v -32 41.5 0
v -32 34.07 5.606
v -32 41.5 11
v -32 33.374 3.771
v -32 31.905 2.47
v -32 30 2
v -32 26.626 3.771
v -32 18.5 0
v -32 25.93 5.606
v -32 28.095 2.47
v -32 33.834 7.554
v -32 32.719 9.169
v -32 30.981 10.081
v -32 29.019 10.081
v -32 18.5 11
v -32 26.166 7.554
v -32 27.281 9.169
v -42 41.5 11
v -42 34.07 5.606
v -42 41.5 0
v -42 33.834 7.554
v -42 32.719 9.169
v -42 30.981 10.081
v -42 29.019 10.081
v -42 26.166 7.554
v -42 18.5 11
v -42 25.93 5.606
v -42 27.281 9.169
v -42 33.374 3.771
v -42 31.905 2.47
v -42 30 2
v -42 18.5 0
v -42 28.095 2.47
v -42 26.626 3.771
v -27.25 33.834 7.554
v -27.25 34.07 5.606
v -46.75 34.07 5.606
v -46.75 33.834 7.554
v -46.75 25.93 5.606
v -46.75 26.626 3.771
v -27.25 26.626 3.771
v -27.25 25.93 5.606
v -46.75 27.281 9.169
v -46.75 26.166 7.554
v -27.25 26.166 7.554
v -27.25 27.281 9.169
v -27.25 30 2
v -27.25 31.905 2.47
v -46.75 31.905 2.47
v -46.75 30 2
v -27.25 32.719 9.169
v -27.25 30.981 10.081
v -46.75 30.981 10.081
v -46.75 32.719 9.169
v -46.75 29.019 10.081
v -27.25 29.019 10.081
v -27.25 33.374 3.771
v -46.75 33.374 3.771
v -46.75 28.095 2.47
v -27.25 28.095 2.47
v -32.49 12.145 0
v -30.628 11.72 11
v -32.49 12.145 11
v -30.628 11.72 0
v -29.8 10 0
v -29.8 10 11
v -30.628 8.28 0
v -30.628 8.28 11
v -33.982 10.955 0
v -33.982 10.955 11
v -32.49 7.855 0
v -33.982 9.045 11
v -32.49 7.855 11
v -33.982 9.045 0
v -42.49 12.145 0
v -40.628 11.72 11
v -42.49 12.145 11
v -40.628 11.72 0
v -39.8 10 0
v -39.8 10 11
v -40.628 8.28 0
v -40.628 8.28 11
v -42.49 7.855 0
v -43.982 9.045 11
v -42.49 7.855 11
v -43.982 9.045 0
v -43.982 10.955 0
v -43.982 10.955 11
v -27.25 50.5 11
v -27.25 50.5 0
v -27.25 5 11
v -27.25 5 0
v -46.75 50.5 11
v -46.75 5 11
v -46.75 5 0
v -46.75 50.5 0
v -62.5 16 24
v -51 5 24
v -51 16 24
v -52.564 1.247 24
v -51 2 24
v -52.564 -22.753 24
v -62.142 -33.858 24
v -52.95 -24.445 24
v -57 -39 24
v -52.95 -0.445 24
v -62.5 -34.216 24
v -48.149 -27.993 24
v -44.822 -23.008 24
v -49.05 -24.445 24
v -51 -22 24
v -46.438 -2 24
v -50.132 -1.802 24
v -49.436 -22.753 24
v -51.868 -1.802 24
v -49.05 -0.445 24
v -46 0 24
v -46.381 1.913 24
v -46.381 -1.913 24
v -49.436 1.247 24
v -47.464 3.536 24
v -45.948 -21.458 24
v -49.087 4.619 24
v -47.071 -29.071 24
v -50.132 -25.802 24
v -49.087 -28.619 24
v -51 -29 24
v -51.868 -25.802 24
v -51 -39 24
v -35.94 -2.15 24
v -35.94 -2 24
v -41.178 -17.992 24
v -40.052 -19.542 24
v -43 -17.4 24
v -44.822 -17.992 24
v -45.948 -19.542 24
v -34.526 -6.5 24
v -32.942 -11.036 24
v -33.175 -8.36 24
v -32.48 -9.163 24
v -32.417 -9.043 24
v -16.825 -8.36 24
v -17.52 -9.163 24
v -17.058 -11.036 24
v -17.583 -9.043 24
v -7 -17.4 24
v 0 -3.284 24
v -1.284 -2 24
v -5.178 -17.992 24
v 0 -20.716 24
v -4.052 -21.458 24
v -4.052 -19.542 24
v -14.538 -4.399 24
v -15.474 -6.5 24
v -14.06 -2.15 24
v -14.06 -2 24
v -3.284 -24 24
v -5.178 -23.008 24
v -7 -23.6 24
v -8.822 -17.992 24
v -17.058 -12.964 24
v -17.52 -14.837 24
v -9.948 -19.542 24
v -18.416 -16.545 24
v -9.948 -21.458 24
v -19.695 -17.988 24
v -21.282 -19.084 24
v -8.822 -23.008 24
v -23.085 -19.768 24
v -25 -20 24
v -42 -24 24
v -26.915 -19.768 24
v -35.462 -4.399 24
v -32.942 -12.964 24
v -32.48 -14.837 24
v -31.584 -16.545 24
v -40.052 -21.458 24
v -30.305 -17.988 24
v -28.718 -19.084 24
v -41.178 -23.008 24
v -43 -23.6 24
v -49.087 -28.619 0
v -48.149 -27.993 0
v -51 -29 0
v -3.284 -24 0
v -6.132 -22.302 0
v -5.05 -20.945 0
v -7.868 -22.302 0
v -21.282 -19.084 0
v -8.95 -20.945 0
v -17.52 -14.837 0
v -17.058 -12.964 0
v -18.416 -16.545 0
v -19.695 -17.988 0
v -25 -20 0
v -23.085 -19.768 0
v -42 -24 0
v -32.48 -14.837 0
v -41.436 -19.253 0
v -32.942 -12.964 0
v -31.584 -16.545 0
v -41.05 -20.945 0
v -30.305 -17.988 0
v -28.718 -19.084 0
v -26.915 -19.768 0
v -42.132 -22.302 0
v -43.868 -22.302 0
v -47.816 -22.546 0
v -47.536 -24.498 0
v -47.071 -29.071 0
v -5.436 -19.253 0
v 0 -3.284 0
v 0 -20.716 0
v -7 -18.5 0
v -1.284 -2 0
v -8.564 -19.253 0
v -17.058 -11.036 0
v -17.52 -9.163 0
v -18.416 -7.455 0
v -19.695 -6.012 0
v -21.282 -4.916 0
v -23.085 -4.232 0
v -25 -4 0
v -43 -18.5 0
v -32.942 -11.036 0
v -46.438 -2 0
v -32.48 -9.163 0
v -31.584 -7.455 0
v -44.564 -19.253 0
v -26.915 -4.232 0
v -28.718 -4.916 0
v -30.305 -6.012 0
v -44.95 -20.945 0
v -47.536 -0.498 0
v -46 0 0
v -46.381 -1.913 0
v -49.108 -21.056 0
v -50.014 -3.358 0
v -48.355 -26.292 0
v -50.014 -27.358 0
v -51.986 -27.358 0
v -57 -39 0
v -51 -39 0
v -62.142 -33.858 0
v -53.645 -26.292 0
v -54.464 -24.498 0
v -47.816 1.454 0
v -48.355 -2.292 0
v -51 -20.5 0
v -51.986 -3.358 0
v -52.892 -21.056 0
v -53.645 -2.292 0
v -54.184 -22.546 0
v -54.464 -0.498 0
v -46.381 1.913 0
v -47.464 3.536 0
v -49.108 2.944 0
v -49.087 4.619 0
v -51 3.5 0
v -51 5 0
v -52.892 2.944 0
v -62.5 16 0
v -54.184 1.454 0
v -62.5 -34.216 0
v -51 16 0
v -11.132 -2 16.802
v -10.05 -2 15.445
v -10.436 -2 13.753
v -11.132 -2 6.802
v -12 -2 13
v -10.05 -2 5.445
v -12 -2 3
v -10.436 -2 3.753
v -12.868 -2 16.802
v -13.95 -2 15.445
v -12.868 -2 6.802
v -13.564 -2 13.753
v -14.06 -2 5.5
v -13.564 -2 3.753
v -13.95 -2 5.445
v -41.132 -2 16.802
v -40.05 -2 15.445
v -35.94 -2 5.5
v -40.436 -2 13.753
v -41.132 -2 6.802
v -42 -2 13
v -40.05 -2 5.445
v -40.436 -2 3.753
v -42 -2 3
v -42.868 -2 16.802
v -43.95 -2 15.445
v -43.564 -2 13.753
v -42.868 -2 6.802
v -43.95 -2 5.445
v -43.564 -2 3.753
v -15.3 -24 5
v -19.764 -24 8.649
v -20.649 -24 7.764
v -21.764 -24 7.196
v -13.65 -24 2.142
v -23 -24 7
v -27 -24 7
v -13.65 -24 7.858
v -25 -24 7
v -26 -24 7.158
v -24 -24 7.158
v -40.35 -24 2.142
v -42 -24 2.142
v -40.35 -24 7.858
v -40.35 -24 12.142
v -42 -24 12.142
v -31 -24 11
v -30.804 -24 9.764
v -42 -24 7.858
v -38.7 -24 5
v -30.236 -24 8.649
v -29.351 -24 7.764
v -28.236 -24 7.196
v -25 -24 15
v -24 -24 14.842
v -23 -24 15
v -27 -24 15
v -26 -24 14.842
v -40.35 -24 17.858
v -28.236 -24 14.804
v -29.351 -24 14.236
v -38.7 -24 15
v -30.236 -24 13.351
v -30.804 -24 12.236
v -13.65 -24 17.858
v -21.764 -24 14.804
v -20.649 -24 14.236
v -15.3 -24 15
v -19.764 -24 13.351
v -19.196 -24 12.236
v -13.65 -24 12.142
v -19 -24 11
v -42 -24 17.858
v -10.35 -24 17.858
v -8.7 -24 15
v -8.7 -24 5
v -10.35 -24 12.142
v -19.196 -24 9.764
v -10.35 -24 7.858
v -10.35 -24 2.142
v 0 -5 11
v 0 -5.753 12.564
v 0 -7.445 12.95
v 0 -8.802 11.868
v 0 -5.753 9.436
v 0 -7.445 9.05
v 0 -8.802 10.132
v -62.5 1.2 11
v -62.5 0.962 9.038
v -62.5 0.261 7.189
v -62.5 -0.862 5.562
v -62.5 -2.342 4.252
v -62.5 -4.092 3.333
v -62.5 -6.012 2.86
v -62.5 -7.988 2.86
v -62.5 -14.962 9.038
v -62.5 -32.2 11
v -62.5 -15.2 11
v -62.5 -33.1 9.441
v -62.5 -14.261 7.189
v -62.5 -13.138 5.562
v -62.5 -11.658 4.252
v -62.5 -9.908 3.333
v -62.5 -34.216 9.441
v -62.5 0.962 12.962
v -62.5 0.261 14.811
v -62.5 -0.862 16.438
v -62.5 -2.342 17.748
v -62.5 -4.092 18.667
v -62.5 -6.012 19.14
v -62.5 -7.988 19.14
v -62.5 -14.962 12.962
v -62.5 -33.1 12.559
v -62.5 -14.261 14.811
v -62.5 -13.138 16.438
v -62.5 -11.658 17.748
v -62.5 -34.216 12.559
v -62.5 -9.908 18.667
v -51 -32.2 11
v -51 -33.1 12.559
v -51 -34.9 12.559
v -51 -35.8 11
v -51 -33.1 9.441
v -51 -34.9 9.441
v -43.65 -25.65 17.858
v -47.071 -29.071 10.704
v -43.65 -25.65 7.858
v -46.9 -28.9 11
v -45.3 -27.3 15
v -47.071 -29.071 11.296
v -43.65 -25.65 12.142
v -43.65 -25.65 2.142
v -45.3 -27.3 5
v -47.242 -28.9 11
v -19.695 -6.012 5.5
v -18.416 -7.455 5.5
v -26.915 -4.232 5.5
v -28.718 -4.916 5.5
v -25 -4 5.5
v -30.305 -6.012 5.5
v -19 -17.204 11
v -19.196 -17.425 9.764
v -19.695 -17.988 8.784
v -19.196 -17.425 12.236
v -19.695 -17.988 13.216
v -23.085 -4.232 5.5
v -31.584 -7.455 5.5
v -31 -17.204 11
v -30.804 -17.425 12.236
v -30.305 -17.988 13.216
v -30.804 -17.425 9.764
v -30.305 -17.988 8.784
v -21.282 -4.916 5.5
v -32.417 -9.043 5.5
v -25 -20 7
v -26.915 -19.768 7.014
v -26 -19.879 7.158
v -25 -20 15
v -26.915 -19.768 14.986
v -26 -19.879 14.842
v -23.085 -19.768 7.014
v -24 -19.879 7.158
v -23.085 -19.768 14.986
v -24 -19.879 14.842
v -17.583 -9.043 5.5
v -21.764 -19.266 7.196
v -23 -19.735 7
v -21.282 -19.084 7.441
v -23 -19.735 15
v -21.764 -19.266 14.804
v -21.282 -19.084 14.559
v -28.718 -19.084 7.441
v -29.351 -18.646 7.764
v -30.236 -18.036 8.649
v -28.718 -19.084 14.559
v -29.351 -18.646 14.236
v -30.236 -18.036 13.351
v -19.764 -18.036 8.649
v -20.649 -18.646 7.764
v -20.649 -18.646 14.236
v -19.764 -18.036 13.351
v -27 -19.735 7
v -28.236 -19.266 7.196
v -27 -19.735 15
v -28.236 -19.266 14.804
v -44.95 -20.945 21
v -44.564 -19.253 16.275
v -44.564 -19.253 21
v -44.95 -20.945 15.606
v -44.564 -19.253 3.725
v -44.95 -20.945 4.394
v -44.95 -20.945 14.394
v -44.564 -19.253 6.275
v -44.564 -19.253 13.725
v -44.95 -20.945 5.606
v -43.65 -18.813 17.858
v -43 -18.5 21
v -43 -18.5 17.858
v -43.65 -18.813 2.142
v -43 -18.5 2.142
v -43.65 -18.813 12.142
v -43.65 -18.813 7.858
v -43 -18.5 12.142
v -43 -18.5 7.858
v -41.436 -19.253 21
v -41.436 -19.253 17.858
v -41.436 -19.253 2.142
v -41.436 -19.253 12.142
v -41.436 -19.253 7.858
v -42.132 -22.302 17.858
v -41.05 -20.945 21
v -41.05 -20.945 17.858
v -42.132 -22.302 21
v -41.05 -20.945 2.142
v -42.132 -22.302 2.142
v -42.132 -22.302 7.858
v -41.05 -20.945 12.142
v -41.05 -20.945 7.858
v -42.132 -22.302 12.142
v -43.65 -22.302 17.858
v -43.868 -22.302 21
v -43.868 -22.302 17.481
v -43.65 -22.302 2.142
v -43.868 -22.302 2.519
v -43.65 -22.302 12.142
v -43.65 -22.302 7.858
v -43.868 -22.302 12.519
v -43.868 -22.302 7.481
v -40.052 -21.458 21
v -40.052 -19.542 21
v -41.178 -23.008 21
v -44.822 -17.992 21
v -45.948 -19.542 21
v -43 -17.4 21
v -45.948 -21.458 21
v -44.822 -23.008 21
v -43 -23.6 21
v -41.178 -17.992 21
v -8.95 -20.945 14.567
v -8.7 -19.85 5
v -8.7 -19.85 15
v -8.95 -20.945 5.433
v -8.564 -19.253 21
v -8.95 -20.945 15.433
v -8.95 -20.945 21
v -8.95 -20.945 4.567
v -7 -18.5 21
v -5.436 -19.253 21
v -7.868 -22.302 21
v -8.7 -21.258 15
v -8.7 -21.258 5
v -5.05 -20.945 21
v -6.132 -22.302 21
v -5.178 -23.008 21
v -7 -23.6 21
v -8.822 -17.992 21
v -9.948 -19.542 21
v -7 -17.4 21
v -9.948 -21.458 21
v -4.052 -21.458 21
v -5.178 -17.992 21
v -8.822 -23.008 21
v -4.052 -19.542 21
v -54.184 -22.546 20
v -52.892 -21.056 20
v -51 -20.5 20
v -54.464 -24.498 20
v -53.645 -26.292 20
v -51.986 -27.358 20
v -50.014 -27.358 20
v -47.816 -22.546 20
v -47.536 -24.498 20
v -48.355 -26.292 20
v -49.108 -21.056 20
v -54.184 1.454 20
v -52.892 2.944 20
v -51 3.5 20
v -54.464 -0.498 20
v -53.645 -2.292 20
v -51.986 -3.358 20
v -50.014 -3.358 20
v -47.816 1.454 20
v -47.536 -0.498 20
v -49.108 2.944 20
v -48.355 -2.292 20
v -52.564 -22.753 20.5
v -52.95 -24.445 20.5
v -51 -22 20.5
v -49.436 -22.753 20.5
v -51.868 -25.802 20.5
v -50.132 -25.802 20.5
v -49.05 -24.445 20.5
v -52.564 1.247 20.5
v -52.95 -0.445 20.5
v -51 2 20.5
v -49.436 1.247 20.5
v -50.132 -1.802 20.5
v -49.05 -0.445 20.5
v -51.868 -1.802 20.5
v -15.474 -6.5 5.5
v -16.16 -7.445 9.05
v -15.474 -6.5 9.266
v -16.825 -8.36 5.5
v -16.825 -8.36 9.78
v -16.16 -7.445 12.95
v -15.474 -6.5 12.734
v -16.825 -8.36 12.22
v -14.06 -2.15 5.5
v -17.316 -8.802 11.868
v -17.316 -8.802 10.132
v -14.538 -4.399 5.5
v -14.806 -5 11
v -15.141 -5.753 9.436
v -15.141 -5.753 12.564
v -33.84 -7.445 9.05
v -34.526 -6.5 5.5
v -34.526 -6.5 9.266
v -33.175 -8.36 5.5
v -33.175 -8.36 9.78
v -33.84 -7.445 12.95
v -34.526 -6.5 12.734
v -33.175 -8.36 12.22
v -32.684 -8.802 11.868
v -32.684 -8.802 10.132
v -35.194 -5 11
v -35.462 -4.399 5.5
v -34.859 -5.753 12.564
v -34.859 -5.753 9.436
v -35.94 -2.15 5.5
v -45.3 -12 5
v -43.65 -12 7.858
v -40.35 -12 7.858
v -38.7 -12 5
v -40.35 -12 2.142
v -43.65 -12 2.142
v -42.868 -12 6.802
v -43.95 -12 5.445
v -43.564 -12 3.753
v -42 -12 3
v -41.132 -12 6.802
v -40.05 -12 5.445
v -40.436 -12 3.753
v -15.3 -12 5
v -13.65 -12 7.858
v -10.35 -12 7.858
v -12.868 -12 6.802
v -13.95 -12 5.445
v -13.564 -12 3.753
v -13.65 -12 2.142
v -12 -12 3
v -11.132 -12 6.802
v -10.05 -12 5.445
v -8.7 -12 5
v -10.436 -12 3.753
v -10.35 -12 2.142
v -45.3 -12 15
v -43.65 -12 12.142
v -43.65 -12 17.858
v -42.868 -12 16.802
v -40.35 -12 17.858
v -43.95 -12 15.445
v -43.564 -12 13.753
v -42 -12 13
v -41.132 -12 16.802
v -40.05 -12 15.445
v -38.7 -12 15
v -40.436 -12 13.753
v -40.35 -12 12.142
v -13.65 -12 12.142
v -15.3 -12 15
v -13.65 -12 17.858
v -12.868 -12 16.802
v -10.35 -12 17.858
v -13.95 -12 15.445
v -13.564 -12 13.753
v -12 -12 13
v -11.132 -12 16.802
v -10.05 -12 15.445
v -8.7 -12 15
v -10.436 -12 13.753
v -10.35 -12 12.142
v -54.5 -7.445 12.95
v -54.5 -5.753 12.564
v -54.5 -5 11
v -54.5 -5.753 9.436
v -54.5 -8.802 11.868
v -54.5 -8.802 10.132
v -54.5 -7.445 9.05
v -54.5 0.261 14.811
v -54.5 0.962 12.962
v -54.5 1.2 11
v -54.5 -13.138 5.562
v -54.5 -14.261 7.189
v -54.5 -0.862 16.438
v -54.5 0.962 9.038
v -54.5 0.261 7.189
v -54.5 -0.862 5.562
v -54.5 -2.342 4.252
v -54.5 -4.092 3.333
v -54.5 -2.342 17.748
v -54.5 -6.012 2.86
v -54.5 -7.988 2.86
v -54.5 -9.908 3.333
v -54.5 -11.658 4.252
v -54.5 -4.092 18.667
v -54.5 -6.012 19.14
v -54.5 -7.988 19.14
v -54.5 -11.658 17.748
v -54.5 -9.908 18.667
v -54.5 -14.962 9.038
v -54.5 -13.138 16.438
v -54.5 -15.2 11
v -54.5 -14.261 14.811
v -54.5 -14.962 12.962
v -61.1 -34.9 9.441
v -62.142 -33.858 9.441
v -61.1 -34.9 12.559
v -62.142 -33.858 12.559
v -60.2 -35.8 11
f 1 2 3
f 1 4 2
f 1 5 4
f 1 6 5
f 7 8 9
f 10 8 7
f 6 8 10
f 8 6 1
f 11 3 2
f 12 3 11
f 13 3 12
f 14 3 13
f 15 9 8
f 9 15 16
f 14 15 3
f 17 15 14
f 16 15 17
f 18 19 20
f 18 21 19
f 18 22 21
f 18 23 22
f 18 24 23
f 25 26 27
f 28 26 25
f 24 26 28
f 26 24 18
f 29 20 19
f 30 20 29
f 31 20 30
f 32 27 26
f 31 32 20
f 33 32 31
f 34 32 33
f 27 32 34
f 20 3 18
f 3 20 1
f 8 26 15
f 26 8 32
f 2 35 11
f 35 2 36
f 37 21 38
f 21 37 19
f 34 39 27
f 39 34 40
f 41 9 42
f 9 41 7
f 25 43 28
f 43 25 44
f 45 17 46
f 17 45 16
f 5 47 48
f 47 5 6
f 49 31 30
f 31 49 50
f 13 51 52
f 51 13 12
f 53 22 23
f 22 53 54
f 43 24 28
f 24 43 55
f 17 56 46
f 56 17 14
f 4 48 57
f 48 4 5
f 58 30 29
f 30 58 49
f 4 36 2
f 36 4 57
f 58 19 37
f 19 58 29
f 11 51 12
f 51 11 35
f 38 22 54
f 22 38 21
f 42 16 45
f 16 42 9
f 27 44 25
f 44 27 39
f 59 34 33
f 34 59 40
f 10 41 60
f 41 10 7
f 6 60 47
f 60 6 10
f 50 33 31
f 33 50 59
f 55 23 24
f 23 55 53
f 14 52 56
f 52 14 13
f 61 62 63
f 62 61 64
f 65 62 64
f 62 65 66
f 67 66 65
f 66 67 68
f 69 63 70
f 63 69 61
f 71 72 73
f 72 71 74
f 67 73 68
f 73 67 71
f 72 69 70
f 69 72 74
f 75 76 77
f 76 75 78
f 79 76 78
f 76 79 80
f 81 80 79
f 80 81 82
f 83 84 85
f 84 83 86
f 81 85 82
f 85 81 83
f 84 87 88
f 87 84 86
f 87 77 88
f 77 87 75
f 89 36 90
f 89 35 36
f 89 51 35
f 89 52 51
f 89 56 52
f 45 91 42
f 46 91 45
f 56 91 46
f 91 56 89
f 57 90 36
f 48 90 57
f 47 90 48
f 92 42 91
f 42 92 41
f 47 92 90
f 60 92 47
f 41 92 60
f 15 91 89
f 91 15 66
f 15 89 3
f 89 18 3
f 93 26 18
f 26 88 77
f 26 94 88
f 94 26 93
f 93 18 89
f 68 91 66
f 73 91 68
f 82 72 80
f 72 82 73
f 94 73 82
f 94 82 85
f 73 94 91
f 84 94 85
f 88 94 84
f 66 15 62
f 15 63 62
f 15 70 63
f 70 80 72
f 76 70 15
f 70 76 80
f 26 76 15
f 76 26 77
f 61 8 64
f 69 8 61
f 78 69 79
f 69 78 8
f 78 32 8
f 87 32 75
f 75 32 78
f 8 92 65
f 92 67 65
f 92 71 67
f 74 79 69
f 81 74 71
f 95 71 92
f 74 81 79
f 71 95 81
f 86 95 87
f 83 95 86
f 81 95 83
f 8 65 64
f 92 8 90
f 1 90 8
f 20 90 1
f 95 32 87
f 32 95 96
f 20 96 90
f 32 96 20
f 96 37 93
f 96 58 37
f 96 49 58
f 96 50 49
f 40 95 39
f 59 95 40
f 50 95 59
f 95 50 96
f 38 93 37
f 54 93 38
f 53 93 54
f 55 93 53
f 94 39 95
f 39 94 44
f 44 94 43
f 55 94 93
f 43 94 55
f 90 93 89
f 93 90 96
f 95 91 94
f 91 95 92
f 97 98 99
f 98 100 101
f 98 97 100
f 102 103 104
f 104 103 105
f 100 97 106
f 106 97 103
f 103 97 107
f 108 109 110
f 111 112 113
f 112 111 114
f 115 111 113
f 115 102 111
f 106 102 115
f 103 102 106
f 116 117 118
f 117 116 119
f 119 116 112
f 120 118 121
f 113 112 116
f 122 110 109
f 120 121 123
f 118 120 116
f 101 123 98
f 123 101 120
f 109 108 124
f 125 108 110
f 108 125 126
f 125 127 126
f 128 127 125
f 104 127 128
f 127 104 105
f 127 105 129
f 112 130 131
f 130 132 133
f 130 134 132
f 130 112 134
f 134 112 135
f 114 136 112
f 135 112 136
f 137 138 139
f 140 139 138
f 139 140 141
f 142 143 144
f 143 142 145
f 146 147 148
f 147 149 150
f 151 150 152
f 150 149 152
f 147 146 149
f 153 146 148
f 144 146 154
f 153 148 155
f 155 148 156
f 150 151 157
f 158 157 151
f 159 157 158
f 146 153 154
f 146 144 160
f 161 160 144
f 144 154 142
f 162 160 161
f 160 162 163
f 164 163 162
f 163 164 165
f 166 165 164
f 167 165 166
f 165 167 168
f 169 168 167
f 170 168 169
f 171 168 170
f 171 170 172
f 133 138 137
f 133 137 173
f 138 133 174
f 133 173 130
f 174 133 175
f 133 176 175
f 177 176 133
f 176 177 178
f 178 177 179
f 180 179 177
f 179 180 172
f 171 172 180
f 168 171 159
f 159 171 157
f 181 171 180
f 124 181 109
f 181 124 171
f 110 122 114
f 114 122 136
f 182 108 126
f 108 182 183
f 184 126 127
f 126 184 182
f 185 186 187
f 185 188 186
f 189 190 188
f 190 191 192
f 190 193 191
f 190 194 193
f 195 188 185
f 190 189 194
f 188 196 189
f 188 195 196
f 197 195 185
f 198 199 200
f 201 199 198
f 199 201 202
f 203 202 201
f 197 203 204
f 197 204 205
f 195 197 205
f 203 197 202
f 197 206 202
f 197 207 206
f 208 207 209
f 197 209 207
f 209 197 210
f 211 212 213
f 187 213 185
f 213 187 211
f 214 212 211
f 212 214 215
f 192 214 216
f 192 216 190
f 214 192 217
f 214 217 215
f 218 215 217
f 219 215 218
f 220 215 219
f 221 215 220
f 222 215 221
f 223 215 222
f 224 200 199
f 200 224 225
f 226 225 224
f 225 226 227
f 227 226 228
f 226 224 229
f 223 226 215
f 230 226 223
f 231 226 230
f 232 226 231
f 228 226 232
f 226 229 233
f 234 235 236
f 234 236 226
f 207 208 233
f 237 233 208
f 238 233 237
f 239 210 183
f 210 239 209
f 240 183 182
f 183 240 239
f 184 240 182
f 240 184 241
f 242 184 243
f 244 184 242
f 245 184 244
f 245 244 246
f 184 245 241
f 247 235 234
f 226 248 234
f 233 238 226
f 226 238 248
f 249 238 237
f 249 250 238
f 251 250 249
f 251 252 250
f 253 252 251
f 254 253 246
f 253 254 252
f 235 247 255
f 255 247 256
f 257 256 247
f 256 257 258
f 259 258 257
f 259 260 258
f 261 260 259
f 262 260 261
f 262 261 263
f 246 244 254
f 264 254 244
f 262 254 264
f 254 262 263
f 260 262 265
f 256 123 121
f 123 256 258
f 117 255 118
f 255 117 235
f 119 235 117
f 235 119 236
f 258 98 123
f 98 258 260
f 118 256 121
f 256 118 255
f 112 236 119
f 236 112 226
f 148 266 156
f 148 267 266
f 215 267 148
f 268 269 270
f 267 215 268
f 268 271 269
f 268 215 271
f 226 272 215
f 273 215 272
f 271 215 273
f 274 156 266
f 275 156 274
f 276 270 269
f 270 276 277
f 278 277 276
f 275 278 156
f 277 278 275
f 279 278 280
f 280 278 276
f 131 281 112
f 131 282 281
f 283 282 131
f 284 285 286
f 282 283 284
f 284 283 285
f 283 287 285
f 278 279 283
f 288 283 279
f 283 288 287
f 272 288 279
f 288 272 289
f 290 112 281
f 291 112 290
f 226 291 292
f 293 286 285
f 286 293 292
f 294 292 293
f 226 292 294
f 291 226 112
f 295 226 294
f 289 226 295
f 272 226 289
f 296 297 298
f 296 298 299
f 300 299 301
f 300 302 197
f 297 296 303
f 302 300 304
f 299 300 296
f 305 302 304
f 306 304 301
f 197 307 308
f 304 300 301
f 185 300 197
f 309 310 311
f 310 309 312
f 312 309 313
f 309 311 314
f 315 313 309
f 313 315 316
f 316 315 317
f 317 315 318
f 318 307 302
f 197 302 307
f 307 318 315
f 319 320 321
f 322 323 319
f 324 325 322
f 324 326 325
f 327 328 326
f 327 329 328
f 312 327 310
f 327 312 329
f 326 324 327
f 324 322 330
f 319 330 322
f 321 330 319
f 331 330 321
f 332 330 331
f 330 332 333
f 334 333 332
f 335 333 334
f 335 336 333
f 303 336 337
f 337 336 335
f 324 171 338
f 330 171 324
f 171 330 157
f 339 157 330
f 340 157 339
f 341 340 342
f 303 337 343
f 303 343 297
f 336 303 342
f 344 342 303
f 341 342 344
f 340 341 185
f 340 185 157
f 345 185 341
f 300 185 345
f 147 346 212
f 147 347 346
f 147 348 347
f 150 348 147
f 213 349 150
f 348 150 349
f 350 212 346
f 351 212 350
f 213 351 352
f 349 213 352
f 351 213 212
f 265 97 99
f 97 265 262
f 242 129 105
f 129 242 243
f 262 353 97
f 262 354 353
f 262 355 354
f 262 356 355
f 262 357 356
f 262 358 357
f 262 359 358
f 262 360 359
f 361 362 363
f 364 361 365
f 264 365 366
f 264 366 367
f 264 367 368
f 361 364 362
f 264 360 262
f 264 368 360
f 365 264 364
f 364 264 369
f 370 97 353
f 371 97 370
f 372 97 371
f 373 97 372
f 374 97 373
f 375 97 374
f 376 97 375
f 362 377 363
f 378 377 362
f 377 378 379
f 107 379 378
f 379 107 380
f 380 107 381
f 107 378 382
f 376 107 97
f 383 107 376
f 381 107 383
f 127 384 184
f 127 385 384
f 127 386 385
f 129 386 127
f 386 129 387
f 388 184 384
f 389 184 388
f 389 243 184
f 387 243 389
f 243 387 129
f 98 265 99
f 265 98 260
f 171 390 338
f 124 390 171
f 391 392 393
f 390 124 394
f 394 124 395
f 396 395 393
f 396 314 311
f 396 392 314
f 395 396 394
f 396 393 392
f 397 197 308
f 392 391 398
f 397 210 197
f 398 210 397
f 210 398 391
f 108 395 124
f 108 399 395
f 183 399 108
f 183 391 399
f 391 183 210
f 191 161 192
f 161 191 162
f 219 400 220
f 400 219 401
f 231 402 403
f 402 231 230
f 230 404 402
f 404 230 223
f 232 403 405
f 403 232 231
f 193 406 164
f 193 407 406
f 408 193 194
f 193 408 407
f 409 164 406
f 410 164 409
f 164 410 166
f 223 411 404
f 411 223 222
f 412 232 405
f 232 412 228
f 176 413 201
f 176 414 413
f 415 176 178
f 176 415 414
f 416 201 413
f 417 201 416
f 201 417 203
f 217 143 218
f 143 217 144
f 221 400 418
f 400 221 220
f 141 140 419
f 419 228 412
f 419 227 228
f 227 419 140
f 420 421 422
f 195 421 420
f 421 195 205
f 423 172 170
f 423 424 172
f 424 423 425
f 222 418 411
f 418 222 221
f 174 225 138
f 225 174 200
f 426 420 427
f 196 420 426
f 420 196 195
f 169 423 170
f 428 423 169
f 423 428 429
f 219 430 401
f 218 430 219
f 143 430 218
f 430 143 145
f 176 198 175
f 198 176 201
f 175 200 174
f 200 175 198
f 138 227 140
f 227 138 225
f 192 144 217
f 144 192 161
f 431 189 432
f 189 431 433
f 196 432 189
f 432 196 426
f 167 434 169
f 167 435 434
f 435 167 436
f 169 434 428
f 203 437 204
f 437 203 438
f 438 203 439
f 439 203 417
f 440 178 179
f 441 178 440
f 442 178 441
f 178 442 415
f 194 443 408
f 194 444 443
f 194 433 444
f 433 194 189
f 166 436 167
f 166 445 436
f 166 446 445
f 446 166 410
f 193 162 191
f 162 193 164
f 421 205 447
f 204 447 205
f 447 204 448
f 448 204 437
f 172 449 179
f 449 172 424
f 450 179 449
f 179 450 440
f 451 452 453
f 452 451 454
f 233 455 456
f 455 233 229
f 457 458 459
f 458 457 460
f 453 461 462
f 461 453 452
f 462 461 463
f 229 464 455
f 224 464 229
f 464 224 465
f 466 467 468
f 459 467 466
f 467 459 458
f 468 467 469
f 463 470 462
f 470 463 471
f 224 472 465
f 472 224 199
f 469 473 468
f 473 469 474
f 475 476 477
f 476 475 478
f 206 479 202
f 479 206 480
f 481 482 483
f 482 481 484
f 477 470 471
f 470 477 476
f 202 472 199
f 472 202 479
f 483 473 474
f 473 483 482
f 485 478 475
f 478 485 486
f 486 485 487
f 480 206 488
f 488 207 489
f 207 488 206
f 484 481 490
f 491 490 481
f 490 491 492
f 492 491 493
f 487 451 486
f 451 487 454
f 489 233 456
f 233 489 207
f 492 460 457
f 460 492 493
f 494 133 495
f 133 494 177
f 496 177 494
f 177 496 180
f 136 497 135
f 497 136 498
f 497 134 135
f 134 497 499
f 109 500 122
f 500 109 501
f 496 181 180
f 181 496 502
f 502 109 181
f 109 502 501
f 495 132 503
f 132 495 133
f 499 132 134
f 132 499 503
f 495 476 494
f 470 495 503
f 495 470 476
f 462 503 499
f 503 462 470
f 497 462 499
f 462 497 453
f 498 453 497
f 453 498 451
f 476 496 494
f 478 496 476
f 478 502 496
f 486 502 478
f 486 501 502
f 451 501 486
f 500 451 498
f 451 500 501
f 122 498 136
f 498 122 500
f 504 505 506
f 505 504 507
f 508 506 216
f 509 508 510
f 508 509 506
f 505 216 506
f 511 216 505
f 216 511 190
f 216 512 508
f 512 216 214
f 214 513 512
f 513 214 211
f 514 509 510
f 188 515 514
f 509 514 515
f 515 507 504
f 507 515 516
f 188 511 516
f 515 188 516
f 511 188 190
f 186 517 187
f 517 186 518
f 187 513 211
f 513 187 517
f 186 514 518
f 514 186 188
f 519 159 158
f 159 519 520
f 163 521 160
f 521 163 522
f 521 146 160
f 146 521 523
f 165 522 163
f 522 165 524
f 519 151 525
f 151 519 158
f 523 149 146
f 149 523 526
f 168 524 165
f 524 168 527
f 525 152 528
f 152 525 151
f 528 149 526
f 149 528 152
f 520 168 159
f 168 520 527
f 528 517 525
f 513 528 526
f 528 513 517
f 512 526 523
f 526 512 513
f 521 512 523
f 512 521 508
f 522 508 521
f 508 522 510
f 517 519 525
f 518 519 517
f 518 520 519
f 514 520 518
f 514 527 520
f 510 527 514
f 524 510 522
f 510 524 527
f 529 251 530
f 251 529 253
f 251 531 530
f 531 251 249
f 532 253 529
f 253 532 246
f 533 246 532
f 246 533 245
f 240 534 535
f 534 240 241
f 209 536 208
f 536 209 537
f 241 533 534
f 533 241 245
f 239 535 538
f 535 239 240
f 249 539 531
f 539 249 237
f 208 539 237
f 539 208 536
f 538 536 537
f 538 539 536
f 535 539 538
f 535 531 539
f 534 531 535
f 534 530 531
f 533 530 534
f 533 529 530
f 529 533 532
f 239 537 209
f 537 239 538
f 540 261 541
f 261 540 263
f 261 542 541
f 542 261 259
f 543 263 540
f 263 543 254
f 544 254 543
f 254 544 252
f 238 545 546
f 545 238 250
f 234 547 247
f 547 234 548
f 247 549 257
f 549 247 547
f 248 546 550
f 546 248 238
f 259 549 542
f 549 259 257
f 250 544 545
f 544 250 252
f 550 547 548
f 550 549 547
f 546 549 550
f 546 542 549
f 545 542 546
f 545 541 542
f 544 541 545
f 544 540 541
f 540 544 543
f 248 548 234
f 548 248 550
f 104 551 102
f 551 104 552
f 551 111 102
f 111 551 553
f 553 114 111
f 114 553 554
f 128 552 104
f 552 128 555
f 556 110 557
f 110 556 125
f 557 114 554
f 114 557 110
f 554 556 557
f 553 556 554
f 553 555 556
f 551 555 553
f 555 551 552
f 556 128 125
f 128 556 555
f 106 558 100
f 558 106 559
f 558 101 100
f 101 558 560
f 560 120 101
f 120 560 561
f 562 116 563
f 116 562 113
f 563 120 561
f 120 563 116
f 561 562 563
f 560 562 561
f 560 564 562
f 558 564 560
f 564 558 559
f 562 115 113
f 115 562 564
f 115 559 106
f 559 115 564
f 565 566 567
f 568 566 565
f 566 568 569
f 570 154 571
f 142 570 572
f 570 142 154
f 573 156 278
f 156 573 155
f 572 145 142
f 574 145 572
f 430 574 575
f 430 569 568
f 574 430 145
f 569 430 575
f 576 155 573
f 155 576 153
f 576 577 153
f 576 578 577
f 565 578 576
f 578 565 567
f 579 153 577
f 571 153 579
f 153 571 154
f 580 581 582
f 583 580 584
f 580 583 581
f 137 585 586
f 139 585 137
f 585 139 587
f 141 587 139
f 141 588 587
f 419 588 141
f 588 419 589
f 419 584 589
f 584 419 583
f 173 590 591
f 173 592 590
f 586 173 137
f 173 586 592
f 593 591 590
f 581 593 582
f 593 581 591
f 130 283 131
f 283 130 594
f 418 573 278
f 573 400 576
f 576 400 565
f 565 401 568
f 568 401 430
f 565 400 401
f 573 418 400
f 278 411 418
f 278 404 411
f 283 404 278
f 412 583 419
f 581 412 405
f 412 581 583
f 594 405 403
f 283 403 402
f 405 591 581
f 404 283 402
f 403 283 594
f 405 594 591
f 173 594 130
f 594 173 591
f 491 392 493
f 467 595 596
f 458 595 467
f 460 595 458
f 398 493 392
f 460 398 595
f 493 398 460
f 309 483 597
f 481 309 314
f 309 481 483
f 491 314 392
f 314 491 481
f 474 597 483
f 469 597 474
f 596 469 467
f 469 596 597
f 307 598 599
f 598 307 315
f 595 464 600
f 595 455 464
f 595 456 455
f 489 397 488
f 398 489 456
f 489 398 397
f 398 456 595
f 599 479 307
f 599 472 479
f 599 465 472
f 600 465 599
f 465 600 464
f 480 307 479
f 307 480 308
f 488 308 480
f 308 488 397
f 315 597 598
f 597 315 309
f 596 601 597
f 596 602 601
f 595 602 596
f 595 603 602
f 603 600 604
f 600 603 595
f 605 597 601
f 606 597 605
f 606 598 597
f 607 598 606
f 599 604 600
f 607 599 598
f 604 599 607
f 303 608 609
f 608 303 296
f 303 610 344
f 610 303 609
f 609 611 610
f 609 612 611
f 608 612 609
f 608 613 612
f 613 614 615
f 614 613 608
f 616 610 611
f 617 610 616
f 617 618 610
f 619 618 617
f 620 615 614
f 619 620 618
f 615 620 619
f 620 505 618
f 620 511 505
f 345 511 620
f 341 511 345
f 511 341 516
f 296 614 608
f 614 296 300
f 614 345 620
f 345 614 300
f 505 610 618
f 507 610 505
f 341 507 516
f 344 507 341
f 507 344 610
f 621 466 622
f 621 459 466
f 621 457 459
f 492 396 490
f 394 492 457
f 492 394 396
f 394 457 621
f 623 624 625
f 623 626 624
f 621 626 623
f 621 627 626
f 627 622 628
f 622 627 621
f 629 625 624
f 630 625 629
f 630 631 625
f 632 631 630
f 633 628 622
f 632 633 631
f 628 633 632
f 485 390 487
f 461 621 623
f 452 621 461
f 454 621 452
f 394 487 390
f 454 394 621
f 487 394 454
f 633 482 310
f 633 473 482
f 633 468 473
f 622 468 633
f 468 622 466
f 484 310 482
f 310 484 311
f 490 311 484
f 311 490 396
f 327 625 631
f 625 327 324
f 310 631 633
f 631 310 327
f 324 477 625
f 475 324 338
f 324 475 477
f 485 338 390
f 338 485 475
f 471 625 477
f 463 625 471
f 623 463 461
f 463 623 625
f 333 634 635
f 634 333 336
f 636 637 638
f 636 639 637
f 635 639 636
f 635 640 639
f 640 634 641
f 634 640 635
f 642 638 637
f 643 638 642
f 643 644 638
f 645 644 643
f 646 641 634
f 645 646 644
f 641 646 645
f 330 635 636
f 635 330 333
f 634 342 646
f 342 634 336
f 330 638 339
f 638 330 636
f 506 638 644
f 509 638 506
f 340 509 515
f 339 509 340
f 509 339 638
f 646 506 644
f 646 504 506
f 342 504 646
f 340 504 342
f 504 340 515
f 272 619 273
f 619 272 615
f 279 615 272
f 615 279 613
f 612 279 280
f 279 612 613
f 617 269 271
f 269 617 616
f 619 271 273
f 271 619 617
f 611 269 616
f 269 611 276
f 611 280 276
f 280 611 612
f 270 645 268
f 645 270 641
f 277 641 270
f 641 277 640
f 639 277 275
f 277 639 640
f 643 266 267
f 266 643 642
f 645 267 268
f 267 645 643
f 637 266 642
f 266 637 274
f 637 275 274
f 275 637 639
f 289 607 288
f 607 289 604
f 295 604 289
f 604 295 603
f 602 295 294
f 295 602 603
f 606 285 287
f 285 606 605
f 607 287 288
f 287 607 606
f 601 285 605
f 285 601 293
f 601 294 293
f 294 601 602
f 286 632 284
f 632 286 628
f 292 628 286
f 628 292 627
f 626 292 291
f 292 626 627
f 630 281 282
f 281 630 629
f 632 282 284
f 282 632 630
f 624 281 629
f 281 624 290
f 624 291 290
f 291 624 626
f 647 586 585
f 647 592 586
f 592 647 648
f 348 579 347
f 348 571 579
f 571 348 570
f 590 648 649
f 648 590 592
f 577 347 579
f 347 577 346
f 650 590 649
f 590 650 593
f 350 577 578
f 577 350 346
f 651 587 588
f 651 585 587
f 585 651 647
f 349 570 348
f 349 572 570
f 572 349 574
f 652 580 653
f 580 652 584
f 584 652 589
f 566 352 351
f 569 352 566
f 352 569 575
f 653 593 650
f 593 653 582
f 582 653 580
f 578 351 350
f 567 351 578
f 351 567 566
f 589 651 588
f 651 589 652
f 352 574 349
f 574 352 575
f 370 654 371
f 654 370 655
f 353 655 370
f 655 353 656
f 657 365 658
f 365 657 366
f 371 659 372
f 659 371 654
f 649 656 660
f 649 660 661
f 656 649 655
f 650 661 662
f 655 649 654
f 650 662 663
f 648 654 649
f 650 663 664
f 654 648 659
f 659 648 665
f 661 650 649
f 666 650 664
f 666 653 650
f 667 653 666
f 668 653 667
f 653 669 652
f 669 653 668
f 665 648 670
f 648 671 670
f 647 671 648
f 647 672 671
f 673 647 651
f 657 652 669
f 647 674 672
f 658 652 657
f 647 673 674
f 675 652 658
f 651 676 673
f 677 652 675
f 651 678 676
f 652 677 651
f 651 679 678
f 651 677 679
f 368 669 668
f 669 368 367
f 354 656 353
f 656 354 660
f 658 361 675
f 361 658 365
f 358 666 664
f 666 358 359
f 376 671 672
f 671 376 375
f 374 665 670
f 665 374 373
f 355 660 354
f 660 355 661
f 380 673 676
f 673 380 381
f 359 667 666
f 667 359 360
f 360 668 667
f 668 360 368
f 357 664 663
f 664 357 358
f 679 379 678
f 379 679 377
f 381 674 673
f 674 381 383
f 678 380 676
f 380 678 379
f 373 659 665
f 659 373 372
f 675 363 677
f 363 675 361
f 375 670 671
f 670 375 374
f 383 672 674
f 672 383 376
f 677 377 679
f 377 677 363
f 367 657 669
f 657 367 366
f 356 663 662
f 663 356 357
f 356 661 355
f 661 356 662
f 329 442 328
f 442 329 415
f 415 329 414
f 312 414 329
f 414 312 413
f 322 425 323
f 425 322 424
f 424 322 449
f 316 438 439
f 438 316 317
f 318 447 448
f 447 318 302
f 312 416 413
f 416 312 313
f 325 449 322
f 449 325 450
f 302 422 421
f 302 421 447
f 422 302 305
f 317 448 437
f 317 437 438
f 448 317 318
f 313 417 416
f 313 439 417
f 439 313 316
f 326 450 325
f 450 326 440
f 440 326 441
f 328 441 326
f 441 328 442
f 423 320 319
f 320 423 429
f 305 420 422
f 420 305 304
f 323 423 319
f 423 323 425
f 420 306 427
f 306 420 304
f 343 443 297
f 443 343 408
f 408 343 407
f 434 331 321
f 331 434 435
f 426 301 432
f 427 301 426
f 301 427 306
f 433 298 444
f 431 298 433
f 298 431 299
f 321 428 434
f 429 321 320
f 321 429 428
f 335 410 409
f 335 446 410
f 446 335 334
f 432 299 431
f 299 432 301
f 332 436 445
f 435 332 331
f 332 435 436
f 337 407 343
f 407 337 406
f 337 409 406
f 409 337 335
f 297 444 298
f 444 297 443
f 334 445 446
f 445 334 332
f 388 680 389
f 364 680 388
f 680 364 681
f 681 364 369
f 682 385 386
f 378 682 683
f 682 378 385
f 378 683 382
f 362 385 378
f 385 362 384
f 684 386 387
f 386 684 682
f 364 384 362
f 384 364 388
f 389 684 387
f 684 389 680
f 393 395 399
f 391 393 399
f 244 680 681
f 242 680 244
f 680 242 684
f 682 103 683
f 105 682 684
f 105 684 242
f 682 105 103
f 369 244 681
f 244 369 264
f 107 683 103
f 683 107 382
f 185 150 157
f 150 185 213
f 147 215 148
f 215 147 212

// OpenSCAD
// file: ../configuration.scad
x_rod_distance = 45;

// Select your belt type ******************************************************

//T2.5
belt_tooth_distance = 2.5;
belt_tooth_ratio = 0.5;

//T5 (strongly discouraged)
//belt_tooth_distance = 5;
//belt_tooth_ratio = 0.75;

//HTD3
//belt_tooth_distance = 3;
//belt_tooth_ratio = 0.75;

//MXL
//belt_tooth_distance = 2.032;
//belt_tooth_ratio = 0.64;

// Select your hot-end mount ******************************************************

// 0 = none; 1 = groove-mount (J-head/MakerGear etc.)
hotend_mount = 1;

hotend_groovemount_depth = 5;
hotend_groovemount_diameter = 11.05;
// main file
// PRUSA iteration3
// Compact extruder
// GNU GPL v3
// Josef Průša <iam@josefprusa.cz> and contributors
// http://www.reprap.org/wiki/Prusa_Mendel
// http://prusamendel.org

include <../configuration.scad>

hotend_groovemount_depth = 8;
hotend_groovemount_diameter = 16.4;


module motor_dummy(){
	translate([-22,-22,-5]) %cube([44,44,5]);
	translate([18,18,-5]) %cylinder(r=2, h=24);
	translate([18,-18,-5]) %cylinder(r=2, h=24);
	translate([-18,18,-5]) %cylinder(r=2, h=24);
	translate([-18,-18,-5]) %cylinder(r=2, h=24);
	translate([-22+2.5+10,0,-5]) %cylinder(r=2.5, h=7);
	
}

module extruder_base(){
 // Main body
 translate([-1,-2,0]) cube([22,56,24]);
 // Extruder plate mount
 if (hotend_mount == 1) { // groove-mount
  translate([-16,49,0]) cube([55,5 + hotend_groovemount_depth - 1.5,24]);
 } else {
  //translate([-16,49,0]) cube([55,5,24]);
 color("green") translate([-19,49,0]) cube([72,5,24]); // -> JMMP
 }
 
 // Carriage mount cylinders
 translate([11,25,0]){
  translate([-12,24,0]) cylinder(r=5, h=24);
  translate([12,24,0]) cylinder(r=5, h=24);
 }

 // Smoother join
 translate([1,38,0]) rotate([0,0,45])  cube([10,10,24]);
}

module extruder_holes(){
 translate([11,25,0]){ // Translate to center of the main block
  // Main shaft opening
  translate([0,-2,-1]) cylinder(r=8, h=26);

  // Lower motor mount hole
  translate([-8.5,18-2,-1]) cylinder(r=2, h=35);
  translate([-8.5,18-2,21]) cylinder(r=3.1, h=35);
  // Upper motor mount hole
  translate([-8.5,-18-2,-1]) cylinder(r=2, h=35);
  translate([-8.5,-18-2,21]) cylinder(r=3.1, h=35);
  // Idler motor mount hole
  translate([-8.5+36,18-2,-1]) cylinder(r=2, h=35);
  translate([-8.5+36,18-2,21]) cylinder(r=3.1, h=35);

  // Carriage mount right screw head hole
  translate([-12,24,-3]) cylinder(r=3.5, h=23);
  // Carriage mount left screw head hole
  translate([12,24,-3]) cylinder(r=3.5, h=23);
  // Carriage mount right screw hole
  translate([-12,24,20.5]) cylinder(r=2, h=23);
  // Carriage mount left screw head hole
  translate([12,24,20.5]) cylinder(r=2, h=23);
  // Idler bearing cutout
  translate([11,0-2,-4.5+10]) cylinder(r=11, h=20);
 }
 // Filament path
 translate([1.5+11+3.5,65,11]) rotate([90,0,0]) cylinder(r=2, h=70);
 if (hotend_mount == 1) {
  // Hole for hotend
  translate([1.5+11+3.5,65,11]) rotate([90,0,0]) cylinder(r=hotend_groovemount_diameter/2, h=12.5);
 }
 // Hole for drive gear check
 translate([1.5+11+3.5-30,25,11]) rotate([90,0,90]) cylinder(r=4, h=70, $fn=20);
 translate([1.5+11+3.5-30,23,11]) rotate([90,0,90]) cylinder(r=4, h=70, $fn=20);
 translate([1.5+11+3.5-30,21,11]) rotate([90,0,90]) cylinder(r=4, h=70, $fn=20);

 // Left extruder plate mounting hole
 translate([1.5+11+3.5+27,65,11]) rotate([90,0,0]) cylinder(r=1.8, h=70);// JMMP
 translate([1.5+11+3.5+15,47,11]) rotate([90,0,0]) cylinder(r=3.1, h=70, $fn=6);
 // Right extruder plate mounting hole
 translate([1.5+11+3.5-27,65,11]) rotate([90,0,0]) cylinder(r=1.8, h=70);//JMMP
 translate([1.5+11+3.5-25,47,11]) rotate([90,0,0]) cylinder(r=3.1, h=70, $fn=6);

  // Idler mounting holse
  translate([11,25,10]){
   // Nut traps
   translate([-30,15,-5]) rotate([0,90,0]) rotate([0,0,30]) cylinder(r=3.3, h=30, $fn=6);
   translate([-30,-15,-5]) rotate([0,90,0]) rotate([0,0,30]) cylinder(r=3.3, h=30, $fn=6);
   translate([-30,15,5]) rotate([0,90,0]) rotate([0,0,30]) cylinder(r=3.3, h=30, $fn=6);
   translate([-30,-15,5]) rotate([0,90,0]) rotate([0,0,30]) cylinder(r=3.3, h=30, $fn=6);
   // Screws
   translate([-30,-15,-5]) rotate([0,90,0]) cylinder(r=2, h=70);
   translate([-30,-15,5]) rotate([0,90,0]) cylinder(r=2, h=70);
   translate([-30, 15,-5]) rotate([0,90,0]) cylinder(r=2, h=70);
   translate([-30, 15,5]) rotate([0,90,0]) cylinder(r=2, h=70);
	}

 translate([58,46,-1]) rotate([0,0,45]) cube([20,20,26]); // JMMP
 translate([46,13,-1]) rotate([0,0,45]) cube([20,20,26]);
 translate([-25,46,-1]) rotate([0,0,45]) cube([20,20,26]);//JMMP
 translate([-22,24,-1]) rotate([0,0,45]) cube([20,20,26]);
 translate([-8,-20,-1]) rotate([0,0,45]) cube([20,20,26]);
 translate([30,-20,-1]) rotate([0,0,45]) cube([20,20,26]);
}

module extruder_idler_base(){
 translate([0.25,0,0]) cube([19.5,45.5,8+3]);
	
}

module extruder_idler_holes(){
 translate([10,25,0]){
  // Main cutout
  cube([10,23,25], center= true);
  // Idler shaft
  translate([-12,0,4.1+2])rotate([0,90,0])cylinder(r=4.1, h=24);
  // Screw holes
  translate([5,-20,-1])cylinder(r=2.2, h=24);
  translate([-5,-20,-1])cylinder(r=2.2, h=24);
 }
}


// Idler final part
module idler(){
 difference(){
  extruder_idler_base();
  extruder_idler_holes();
 }
}

//translate([10,0,1]) rotate([0,-90,0]) idler();
translate([-47,5,0])  idler();
// Extruder final part
module extruder(){
 translate([-23,2,0])difference(){
  extruder_base();
  extruder_holes();
 }
}

rotate ([0,0,90]) extruder();
//translate([-2.5,25,0]) motor_dummy();
//idler();
